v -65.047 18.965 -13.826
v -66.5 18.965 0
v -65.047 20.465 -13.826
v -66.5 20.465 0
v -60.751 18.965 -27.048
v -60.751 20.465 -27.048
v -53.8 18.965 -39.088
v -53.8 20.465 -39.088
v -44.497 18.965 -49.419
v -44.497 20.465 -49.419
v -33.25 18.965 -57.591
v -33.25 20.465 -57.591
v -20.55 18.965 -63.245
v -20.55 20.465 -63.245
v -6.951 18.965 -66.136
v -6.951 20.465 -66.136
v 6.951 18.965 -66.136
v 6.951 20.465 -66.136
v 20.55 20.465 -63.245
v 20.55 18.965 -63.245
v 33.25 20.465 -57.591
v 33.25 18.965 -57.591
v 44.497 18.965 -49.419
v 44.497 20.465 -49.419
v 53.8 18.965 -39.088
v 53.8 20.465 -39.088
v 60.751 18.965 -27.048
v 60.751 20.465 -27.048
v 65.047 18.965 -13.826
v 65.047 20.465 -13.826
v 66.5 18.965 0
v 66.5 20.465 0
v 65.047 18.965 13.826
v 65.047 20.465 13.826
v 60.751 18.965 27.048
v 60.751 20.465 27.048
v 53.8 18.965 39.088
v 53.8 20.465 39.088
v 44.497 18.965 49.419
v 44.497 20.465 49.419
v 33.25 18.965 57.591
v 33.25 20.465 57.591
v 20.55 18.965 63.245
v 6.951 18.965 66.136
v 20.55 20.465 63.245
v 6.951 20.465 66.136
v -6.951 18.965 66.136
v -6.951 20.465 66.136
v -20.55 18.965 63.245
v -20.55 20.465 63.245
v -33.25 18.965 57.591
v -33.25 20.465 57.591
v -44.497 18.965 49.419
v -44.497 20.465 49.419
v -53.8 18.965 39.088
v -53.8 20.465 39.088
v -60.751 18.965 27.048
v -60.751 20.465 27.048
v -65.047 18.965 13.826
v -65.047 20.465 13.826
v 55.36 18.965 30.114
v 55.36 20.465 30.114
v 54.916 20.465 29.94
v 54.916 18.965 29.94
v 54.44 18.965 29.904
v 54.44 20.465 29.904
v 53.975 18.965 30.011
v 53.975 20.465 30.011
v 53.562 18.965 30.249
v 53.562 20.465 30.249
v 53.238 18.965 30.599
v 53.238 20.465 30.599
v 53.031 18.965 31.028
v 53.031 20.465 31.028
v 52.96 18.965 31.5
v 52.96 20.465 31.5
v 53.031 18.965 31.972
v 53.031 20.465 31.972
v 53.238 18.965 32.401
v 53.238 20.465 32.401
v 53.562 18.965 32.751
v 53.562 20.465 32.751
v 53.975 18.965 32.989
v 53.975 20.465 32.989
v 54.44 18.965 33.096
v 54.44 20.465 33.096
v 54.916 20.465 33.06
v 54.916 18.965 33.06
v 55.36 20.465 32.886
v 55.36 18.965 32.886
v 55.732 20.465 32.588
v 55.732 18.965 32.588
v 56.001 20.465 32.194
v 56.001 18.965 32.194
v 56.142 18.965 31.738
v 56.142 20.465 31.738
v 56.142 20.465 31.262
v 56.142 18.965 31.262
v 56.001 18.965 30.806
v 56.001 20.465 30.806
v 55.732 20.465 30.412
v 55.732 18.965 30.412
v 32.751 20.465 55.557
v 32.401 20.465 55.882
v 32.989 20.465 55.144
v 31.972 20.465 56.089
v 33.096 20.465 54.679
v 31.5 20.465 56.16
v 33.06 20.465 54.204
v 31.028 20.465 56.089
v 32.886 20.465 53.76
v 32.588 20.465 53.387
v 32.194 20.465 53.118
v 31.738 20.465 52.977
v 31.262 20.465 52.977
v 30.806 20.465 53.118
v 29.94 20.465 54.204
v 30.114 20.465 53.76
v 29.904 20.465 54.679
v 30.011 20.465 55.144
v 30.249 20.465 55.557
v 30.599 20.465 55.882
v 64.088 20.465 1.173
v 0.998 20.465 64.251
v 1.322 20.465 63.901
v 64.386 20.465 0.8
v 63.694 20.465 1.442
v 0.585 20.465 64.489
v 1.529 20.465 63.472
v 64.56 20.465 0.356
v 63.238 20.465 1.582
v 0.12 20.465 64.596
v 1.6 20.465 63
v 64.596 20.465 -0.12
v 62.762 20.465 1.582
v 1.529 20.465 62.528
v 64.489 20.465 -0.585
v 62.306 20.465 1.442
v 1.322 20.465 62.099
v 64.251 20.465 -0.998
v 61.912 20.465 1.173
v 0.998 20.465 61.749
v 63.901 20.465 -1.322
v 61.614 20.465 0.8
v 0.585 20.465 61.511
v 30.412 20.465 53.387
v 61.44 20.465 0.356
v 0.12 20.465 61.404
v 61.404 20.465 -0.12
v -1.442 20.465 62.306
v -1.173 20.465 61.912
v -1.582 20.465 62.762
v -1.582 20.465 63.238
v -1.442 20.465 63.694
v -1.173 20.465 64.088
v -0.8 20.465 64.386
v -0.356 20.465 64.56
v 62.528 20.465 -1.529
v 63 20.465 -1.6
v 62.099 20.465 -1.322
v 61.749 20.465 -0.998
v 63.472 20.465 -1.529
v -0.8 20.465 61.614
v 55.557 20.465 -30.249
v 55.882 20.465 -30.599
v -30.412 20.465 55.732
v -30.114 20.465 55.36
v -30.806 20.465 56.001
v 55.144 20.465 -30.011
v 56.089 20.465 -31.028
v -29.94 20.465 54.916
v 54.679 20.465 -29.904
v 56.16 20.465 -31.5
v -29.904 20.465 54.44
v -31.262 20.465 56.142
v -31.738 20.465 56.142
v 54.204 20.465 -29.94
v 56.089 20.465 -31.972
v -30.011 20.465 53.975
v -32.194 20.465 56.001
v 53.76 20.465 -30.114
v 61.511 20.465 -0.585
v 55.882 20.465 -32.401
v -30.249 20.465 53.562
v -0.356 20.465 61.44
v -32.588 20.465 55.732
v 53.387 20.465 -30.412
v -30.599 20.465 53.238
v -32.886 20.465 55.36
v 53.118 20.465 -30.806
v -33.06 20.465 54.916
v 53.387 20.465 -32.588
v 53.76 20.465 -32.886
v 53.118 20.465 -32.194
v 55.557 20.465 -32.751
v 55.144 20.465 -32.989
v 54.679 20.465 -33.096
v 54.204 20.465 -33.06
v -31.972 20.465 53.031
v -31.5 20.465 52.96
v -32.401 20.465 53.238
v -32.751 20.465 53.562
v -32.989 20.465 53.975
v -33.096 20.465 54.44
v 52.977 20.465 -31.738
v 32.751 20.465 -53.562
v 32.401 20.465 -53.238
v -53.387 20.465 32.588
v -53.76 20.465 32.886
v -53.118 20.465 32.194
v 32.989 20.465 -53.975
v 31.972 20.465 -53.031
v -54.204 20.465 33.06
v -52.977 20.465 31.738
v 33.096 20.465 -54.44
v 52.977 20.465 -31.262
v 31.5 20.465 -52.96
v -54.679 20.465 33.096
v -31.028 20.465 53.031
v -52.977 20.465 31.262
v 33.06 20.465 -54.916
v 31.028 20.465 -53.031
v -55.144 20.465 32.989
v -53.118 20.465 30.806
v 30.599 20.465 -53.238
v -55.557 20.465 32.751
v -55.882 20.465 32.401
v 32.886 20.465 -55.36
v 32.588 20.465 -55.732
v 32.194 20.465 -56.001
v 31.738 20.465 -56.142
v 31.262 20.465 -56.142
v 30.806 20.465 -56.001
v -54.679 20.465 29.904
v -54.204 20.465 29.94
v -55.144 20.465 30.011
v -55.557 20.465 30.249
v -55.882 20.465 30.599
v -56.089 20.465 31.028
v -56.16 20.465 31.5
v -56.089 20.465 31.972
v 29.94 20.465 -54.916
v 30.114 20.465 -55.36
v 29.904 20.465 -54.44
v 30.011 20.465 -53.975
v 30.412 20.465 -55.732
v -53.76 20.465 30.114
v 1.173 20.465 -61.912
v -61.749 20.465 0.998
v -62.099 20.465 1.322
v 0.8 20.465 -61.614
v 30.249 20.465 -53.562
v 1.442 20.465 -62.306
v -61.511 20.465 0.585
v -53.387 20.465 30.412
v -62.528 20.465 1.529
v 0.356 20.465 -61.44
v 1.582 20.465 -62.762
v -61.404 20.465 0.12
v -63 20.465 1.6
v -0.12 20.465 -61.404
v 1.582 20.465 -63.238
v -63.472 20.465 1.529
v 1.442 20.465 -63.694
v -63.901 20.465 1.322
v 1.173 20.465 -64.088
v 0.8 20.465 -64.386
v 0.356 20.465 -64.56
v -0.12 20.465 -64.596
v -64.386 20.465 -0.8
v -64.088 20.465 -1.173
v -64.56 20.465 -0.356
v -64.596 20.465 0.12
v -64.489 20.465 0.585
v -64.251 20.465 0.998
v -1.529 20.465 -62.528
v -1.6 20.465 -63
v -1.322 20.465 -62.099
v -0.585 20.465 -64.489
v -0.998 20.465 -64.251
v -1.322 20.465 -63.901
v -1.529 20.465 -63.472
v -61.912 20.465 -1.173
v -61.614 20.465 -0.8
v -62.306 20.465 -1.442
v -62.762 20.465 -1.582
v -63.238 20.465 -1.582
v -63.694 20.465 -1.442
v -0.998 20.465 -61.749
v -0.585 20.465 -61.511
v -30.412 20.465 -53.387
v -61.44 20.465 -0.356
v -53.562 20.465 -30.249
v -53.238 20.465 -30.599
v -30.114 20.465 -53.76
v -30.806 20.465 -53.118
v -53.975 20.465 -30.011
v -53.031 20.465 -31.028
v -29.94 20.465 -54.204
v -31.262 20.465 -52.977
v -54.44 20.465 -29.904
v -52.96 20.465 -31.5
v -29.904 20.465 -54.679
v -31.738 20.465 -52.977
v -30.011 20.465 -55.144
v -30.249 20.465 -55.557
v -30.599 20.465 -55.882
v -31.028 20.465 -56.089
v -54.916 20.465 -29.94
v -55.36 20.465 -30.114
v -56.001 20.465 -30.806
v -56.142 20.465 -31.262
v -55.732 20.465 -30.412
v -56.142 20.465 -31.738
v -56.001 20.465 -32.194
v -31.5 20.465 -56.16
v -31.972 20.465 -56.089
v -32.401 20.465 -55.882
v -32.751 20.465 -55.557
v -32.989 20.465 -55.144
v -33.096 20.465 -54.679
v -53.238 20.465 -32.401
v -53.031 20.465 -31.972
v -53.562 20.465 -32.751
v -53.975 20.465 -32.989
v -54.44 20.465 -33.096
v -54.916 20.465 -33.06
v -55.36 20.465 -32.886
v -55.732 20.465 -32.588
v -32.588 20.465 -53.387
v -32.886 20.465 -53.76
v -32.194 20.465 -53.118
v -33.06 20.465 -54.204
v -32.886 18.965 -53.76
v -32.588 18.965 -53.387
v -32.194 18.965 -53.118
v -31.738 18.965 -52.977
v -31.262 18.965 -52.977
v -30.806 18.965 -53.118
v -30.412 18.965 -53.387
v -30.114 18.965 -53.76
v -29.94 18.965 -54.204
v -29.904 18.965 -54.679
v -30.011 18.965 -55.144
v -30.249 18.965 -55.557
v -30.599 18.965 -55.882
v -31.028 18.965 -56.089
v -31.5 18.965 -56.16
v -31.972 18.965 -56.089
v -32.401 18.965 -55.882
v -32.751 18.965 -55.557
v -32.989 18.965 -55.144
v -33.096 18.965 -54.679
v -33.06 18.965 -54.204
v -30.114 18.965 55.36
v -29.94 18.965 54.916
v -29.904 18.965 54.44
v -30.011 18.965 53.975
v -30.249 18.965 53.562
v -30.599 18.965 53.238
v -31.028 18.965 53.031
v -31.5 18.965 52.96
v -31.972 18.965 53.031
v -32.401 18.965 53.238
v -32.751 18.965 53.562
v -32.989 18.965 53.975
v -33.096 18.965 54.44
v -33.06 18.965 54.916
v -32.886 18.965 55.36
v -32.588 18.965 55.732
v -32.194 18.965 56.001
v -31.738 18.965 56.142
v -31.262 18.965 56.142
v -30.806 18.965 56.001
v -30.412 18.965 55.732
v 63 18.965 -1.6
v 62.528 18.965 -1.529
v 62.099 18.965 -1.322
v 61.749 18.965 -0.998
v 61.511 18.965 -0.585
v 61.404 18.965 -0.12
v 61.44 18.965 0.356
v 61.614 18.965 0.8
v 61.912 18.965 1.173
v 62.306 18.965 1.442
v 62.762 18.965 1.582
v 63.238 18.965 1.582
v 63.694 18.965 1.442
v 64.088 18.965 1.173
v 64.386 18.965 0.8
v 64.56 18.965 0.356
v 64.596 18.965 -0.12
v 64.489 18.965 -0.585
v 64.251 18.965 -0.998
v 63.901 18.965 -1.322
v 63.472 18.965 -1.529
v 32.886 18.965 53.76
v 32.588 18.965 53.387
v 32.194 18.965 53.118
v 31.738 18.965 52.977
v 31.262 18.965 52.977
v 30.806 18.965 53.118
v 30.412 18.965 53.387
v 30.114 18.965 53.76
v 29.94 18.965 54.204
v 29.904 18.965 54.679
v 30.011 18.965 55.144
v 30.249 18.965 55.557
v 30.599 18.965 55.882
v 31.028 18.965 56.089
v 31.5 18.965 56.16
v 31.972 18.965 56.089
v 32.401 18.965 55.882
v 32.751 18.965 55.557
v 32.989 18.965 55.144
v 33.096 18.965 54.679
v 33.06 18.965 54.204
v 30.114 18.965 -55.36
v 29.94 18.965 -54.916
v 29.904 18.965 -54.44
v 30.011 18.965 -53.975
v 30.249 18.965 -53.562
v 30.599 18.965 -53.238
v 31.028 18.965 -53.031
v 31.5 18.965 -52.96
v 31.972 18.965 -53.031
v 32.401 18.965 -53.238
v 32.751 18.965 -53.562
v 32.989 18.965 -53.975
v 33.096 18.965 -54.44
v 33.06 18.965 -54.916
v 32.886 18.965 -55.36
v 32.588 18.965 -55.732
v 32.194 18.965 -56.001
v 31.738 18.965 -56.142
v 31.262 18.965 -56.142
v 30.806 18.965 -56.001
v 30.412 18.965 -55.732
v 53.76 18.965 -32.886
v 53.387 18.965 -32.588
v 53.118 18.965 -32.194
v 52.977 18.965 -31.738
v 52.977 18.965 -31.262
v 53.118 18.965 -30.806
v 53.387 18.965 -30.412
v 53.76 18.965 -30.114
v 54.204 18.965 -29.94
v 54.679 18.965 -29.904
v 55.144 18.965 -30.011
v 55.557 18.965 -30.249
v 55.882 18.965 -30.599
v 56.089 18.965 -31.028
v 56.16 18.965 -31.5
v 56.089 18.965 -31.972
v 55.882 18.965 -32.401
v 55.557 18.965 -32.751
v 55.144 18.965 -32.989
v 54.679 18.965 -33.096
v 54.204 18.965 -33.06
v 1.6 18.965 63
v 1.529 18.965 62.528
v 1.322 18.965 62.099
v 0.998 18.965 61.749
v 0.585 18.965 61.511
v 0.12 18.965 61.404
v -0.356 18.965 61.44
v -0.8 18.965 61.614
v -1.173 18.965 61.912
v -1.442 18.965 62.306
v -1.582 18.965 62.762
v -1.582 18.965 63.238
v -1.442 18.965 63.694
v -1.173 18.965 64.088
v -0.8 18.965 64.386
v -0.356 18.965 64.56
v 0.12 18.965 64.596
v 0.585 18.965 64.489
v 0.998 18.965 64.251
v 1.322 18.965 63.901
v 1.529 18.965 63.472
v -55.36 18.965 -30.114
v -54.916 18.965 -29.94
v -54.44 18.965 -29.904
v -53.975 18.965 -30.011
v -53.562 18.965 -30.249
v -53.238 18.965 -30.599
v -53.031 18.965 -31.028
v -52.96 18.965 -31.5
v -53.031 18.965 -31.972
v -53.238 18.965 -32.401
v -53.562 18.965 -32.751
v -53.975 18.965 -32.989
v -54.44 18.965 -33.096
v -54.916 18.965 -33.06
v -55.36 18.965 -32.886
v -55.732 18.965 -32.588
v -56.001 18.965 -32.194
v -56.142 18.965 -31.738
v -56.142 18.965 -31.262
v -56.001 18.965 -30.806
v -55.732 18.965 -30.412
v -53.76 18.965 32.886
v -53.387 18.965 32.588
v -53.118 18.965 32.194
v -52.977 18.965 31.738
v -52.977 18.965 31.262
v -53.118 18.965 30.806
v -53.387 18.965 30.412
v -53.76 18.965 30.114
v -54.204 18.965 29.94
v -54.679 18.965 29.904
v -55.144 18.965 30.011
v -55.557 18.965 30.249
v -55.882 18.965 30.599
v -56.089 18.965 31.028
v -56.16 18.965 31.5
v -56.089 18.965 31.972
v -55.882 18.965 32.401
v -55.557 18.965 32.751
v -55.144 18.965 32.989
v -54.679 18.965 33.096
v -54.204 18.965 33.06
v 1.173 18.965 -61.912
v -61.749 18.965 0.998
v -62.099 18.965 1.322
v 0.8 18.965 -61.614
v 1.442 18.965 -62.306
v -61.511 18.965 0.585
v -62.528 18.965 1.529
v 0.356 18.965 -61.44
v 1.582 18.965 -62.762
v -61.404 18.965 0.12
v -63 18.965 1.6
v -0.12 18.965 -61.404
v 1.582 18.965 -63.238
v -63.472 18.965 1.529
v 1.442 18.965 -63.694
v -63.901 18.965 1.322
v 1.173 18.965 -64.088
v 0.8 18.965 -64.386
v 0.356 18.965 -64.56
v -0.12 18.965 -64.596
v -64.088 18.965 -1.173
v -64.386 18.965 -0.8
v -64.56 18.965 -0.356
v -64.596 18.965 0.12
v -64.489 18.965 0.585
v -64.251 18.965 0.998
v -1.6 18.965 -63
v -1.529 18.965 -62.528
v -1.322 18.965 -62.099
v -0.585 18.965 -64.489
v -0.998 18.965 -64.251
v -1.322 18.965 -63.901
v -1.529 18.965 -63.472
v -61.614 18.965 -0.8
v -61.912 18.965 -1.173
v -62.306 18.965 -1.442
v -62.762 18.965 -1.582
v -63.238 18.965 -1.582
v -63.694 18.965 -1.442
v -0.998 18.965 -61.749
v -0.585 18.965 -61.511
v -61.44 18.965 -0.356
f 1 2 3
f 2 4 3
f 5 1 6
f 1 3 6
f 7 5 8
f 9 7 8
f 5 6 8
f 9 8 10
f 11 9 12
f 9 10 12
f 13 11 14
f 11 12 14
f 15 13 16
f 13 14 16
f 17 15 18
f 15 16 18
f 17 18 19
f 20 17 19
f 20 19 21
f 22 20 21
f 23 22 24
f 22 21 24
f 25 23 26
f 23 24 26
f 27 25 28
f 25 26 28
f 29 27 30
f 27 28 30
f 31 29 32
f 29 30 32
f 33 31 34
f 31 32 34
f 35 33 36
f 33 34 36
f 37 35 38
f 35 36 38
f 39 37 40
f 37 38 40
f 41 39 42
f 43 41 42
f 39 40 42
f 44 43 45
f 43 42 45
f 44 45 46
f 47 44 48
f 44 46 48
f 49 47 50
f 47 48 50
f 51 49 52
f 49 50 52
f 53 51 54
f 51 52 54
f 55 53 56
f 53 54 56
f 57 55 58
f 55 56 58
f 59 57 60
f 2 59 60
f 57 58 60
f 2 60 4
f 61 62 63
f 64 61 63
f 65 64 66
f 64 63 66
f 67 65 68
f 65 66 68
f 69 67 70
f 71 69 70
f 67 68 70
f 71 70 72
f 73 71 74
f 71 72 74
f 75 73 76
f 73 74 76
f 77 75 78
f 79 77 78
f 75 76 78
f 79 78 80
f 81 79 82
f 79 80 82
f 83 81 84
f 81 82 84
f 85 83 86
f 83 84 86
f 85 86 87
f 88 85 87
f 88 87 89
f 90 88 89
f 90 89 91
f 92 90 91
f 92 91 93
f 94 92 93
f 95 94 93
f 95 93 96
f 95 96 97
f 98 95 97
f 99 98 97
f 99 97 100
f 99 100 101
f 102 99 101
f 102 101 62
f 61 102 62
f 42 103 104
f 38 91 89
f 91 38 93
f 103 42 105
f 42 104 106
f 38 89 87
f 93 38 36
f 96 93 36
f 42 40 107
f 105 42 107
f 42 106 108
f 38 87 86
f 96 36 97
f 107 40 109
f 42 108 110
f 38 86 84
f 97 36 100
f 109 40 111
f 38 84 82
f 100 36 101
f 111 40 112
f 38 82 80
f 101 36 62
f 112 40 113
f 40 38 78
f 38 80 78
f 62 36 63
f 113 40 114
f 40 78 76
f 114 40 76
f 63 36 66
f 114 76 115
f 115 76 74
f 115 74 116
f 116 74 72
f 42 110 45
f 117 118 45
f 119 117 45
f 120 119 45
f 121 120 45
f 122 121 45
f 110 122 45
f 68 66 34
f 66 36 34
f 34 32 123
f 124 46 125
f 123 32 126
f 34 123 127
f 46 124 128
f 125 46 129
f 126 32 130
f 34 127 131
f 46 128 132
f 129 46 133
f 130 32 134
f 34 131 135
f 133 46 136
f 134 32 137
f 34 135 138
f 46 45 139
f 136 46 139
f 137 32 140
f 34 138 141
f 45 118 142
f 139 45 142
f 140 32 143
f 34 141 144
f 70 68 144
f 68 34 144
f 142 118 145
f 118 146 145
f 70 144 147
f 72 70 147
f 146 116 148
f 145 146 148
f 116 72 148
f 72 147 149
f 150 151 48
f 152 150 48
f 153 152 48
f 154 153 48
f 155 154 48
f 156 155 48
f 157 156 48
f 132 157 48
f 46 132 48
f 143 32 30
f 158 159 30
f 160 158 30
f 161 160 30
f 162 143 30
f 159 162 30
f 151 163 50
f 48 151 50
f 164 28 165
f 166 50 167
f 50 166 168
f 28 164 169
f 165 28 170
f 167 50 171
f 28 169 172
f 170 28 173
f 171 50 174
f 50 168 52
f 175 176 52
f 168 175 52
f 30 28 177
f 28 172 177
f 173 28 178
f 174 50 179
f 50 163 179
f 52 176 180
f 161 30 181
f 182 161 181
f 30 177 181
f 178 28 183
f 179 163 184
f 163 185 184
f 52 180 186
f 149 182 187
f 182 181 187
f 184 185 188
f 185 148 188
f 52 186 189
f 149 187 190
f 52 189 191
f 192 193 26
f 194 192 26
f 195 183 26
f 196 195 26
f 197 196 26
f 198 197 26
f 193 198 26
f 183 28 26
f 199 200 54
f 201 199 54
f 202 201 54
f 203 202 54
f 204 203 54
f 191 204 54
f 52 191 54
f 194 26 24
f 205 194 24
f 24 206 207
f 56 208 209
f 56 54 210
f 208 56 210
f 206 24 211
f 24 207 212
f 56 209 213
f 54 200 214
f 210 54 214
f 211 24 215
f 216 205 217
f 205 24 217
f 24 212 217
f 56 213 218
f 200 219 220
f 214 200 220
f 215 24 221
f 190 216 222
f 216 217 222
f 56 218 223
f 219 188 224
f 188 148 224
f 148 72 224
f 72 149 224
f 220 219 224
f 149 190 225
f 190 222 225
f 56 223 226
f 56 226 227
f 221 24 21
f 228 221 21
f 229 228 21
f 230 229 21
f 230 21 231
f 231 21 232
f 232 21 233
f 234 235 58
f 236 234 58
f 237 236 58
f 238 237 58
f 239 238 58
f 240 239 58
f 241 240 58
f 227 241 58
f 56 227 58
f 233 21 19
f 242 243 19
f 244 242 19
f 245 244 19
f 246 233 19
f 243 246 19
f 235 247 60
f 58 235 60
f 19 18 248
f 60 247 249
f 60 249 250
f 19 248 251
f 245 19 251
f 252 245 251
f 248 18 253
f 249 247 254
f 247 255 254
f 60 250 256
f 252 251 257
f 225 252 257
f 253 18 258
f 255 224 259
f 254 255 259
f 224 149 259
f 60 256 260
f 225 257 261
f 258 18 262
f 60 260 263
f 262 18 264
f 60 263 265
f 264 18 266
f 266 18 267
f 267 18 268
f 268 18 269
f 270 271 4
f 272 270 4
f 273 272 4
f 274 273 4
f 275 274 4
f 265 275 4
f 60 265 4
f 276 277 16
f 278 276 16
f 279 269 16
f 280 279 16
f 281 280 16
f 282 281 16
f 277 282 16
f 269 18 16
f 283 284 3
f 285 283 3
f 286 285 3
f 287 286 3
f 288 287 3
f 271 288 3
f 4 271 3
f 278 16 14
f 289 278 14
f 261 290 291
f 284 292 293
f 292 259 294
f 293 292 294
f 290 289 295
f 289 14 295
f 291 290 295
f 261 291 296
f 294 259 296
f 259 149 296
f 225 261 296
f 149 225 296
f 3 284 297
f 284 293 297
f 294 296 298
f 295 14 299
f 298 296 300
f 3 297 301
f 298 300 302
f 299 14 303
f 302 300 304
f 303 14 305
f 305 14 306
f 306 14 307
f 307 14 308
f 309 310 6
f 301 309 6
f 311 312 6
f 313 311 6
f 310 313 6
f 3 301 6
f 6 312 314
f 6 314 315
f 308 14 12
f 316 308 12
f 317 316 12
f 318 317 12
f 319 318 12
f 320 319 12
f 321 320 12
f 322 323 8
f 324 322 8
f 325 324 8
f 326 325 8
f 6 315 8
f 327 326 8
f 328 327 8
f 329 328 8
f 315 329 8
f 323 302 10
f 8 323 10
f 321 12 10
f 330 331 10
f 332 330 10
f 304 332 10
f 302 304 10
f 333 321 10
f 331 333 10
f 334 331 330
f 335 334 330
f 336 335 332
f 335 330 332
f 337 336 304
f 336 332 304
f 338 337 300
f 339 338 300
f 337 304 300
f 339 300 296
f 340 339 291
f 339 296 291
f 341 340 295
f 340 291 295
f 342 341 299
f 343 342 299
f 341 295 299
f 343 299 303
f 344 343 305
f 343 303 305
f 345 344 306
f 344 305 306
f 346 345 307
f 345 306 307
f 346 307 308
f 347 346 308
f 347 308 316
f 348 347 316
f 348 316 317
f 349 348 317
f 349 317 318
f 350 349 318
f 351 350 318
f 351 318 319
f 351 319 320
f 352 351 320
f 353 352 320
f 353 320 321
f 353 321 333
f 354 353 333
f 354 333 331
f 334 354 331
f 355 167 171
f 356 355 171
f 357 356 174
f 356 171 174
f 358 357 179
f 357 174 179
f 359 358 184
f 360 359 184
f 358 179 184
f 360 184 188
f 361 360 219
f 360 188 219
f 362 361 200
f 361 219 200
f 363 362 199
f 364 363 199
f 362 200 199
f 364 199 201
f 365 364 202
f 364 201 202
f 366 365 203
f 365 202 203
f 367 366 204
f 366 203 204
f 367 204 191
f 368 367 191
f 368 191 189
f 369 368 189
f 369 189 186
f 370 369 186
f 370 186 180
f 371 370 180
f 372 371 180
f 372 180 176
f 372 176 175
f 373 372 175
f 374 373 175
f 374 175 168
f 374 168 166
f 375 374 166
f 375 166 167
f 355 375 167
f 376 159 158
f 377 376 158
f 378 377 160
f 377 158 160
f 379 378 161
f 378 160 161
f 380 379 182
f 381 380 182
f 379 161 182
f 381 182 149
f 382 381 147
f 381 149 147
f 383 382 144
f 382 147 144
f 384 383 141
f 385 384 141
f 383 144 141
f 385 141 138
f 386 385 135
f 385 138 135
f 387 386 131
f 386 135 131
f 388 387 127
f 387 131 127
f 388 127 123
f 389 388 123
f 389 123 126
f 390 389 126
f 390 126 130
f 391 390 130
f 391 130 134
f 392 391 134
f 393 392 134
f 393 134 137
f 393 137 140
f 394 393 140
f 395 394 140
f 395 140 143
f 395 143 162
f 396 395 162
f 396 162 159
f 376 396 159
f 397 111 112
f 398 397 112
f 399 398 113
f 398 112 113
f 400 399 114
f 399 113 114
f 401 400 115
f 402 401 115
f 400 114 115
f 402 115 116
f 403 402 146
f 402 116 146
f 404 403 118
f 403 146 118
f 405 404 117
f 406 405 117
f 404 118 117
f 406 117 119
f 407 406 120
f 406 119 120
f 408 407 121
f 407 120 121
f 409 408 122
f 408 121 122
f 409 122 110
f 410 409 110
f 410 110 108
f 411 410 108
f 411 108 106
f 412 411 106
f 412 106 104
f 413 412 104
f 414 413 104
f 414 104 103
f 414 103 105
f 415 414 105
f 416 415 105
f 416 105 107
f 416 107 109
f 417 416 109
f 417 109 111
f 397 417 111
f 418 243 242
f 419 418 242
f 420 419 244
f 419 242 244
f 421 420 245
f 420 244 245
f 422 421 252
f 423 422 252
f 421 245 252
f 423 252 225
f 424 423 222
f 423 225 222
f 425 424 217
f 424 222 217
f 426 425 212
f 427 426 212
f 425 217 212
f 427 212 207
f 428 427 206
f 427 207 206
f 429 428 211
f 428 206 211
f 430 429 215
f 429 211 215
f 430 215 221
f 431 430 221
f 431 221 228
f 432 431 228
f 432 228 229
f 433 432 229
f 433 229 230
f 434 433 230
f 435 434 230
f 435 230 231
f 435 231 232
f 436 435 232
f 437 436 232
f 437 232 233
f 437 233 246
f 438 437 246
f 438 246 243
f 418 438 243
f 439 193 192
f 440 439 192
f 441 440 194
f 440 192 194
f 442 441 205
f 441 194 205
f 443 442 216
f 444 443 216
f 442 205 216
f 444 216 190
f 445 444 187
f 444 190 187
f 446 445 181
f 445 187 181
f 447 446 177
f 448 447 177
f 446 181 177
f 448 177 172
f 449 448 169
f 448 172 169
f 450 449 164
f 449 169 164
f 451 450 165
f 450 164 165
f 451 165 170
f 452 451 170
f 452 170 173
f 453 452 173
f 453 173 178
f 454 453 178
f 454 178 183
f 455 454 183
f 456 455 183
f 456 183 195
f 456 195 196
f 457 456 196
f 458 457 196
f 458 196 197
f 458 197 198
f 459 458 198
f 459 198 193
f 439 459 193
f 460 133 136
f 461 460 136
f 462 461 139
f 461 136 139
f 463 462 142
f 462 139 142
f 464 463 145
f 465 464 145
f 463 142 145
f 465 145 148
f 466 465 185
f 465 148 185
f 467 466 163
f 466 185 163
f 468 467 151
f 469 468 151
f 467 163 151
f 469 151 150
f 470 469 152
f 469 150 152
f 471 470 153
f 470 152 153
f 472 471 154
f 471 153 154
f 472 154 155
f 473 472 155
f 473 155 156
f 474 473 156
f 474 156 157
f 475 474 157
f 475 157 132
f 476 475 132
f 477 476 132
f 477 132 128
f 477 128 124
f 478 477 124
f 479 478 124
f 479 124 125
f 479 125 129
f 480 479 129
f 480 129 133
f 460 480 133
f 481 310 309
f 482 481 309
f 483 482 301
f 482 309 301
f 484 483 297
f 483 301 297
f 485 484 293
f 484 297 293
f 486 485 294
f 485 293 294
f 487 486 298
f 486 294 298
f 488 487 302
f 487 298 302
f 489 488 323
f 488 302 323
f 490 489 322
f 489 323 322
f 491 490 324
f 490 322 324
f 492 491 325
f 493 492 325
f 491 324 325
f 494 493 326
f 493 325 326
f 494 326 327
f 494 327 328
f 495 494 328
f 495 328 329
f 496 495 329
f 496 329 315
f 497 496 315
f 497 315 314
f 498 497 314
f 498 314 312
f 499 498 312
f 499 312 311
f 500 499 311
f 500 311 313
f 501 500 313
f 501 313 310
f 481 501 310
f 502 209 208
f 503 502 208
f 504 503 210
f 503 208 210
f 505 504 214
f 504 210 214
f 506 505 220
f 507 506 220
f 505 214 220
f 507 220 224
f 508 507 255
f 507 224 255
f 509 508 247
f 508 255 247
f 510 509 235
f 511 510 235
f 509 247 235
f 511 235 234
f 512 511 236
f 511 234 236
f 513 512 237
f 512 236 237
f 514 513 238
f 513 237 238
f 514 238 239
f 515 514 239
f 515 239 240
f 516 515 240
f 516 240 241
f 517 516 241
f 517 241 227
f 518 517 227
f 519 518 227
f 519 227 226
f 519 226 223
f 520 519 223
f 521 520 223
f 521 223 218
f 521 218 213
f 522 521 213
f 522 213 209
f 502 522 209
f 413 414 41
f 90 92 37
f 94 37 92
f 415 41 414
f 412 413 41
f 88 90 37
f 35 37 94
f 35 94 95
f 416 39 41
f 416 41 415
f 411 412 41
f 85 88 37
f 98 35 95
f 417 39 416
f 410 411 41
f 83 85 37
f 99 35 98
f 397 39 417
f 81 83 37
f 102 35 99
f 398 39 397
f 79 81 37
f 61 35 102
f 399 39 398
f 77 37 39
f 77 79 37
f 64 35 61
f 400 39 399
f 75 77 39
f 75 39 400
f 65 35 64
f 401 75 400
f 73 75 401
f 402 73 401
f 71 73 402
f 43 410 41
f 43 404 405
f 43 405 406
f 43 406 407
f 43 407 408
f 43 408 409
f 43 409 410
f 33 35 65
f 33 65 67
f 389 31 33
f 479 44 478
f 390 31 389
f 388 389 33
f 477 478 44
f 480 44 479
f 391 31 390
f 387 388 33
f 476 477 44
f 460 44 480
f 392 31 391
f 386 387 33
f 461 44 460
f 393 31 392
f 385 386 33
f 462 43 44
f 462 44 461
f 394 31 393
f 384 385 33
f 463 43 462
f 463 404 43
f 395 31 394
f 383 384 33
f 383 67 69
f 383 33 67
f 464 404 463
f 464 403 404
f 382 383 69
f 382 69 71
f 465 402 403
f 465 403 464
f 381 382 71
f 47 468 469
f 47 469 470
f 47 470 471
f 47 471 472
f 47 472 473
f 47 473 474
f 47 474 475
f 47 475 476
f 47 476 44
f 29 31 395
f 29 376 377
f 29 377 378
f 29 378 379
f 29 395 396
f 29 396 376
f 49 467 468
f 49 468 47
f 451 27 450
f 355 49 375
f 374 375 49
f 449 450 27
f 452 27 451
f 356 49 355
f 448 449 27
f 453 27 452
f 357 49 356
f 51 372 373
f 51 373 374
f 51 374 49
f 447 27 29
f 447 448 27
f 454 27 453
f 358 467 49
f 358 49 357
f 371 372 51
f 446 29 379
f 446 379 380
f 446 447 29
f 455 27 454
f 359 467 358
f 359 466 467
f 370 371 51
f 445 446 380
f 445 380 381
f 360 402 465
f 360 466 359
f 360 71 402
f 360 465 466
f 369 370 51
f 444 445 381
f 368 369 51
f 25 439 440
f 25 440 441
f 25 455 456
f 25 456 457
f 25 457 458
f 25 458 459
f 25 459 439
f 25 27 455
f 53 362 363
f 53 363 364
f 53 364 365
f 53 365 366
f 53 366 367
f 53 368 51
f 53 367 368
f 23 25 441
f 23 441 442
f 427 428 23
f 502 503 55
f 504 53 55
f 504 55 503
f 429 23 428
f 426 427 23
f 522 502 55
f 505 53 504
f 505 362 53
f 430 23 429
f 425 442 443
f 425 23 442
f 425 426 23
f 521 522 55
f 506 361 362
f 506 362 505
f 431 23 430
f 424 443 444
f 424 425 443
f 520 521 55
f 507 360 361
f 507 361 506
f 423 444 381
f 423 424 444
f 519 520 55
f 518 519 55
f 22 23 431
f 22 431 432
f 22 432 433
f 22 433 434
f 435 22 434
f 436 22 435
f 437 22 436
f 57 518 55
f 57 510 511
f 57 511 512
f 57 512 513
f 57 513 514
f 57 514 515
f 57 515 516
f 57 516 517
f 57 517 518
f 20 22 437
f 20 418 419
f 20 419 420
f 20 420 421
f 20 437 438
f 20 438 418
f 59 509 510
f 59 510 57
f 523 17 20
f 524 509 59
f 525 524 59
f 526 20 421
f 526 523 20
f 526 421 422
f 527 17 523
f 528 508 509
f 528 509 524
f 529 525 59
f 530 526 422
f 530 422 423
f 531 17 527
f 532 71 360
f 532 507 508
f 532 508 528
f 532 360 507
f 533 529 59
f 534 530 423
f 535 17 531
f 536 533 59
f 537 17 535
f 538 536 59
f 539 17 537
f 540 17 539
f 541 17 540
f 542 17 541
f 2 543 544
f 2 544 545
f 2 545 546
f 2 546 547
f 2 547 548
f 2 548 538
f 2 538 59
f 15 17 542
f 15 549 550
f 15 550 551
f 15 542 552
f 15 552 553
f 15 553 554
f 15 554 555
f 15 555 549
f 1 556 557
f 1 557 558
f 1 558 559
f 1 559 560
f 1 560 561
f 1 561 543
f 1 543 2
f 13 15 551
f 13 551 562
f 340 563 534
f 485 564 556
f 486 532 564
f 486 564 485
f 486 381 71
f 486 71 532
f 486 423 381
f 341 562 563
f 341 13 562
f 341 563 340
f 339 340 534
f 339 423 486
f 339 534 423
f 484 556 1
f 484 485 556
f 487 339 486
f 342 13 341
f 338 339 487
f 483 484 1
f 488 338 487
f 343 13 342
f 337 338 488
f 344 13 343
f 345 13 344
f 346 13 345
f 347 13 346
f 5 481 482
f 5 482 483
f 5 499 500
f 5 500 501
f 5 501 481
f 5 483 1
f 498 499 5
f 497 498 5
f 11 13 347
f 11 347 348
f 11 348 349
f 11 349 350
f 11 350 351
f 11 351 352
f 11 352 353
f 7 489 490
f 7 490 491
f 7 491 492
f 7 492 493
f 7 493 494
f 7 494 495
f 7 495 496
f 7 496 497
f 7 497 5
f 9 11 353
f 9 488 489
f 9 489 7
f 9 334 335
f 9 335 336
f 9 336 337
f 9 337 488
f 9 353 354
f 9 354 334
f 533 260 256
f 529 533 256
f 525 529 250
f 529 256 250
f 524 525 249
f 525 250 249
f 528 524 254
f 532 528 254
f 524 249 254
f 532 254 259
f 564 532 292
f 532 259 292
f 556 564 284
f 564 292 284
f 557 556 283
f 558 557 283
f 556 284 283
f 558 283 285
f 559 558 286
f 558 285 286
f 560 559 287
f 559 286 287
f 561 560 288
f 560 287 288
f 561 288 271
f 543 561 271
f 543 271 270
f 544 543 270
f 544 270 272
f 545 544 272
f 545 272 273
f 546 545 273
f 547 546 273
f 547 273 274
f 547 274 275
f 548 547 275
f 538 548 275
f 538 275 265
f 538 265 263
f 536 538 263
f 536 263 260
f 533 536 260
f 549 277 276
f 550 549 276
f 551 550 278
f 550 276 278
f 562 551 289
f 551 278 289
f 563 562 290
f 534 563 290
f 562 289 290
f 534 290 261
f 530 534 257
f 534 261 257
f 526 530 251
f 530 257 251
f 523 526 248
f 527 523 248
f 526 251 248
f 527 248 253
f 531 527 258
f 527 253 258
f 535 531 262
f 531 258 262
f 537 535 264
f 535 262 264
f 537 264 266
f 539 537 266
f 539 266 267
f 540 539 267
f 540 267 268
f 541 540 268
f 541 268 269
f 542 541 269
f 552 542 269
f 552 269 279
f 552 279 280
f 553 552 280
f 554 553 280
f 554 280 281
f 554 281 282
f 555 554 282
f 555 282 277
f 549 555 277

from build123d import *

# Parameters (mm, degrees)
SKETCH1_W          = 66.5
SKETCH1_H          = 1.5
SKETCH7_R          = 1.6
CUT_EXTRUDE1_DEPTH = 95.05716347
CIRPATTERN2_COUNT  = 12


with BuildPart() as part:
    # Sketch1 → Revolve1 (revolve)
    with BuildSketch(Plane.XY):
        with Locations((-33.25, 19.715)):
            Rectangle(SKETCH1_W, SKETCH1_H)
    revolve(axis=Axis((0, 20.465, 0), (0, -1, 0)))

    # Sketch7 → Cut-Extrude1 (cut, through all)
    with BuildSketch(Plane(origin=(0, 20.465, 0), x_dir=(1, 0, 0), z_dir=(0, 1, 0))):
        with Locations(Location((0, 63, 0), (0, 0, 180))):
            Circle(SKETCH7_R)
    cut_extrude1 = extrude(amount=-CUT_EXTRUDE1_DEPTH, mode=Mode.SUBTRACT)

    # CirPattern2: Cut-Extrude1 ×12 about axis
    cirpattern2_axis = Axis((0, 0, 0), (0, 1, 0))
    for i in range(1, CIRPATTERN2_COUNT):
        add(cut_extrude1.rotate(cirpattern2_axis, i * 360 / CIRPATTERN2_COUNT), mode=Mode.SUBTRACT)


solid = part.part
